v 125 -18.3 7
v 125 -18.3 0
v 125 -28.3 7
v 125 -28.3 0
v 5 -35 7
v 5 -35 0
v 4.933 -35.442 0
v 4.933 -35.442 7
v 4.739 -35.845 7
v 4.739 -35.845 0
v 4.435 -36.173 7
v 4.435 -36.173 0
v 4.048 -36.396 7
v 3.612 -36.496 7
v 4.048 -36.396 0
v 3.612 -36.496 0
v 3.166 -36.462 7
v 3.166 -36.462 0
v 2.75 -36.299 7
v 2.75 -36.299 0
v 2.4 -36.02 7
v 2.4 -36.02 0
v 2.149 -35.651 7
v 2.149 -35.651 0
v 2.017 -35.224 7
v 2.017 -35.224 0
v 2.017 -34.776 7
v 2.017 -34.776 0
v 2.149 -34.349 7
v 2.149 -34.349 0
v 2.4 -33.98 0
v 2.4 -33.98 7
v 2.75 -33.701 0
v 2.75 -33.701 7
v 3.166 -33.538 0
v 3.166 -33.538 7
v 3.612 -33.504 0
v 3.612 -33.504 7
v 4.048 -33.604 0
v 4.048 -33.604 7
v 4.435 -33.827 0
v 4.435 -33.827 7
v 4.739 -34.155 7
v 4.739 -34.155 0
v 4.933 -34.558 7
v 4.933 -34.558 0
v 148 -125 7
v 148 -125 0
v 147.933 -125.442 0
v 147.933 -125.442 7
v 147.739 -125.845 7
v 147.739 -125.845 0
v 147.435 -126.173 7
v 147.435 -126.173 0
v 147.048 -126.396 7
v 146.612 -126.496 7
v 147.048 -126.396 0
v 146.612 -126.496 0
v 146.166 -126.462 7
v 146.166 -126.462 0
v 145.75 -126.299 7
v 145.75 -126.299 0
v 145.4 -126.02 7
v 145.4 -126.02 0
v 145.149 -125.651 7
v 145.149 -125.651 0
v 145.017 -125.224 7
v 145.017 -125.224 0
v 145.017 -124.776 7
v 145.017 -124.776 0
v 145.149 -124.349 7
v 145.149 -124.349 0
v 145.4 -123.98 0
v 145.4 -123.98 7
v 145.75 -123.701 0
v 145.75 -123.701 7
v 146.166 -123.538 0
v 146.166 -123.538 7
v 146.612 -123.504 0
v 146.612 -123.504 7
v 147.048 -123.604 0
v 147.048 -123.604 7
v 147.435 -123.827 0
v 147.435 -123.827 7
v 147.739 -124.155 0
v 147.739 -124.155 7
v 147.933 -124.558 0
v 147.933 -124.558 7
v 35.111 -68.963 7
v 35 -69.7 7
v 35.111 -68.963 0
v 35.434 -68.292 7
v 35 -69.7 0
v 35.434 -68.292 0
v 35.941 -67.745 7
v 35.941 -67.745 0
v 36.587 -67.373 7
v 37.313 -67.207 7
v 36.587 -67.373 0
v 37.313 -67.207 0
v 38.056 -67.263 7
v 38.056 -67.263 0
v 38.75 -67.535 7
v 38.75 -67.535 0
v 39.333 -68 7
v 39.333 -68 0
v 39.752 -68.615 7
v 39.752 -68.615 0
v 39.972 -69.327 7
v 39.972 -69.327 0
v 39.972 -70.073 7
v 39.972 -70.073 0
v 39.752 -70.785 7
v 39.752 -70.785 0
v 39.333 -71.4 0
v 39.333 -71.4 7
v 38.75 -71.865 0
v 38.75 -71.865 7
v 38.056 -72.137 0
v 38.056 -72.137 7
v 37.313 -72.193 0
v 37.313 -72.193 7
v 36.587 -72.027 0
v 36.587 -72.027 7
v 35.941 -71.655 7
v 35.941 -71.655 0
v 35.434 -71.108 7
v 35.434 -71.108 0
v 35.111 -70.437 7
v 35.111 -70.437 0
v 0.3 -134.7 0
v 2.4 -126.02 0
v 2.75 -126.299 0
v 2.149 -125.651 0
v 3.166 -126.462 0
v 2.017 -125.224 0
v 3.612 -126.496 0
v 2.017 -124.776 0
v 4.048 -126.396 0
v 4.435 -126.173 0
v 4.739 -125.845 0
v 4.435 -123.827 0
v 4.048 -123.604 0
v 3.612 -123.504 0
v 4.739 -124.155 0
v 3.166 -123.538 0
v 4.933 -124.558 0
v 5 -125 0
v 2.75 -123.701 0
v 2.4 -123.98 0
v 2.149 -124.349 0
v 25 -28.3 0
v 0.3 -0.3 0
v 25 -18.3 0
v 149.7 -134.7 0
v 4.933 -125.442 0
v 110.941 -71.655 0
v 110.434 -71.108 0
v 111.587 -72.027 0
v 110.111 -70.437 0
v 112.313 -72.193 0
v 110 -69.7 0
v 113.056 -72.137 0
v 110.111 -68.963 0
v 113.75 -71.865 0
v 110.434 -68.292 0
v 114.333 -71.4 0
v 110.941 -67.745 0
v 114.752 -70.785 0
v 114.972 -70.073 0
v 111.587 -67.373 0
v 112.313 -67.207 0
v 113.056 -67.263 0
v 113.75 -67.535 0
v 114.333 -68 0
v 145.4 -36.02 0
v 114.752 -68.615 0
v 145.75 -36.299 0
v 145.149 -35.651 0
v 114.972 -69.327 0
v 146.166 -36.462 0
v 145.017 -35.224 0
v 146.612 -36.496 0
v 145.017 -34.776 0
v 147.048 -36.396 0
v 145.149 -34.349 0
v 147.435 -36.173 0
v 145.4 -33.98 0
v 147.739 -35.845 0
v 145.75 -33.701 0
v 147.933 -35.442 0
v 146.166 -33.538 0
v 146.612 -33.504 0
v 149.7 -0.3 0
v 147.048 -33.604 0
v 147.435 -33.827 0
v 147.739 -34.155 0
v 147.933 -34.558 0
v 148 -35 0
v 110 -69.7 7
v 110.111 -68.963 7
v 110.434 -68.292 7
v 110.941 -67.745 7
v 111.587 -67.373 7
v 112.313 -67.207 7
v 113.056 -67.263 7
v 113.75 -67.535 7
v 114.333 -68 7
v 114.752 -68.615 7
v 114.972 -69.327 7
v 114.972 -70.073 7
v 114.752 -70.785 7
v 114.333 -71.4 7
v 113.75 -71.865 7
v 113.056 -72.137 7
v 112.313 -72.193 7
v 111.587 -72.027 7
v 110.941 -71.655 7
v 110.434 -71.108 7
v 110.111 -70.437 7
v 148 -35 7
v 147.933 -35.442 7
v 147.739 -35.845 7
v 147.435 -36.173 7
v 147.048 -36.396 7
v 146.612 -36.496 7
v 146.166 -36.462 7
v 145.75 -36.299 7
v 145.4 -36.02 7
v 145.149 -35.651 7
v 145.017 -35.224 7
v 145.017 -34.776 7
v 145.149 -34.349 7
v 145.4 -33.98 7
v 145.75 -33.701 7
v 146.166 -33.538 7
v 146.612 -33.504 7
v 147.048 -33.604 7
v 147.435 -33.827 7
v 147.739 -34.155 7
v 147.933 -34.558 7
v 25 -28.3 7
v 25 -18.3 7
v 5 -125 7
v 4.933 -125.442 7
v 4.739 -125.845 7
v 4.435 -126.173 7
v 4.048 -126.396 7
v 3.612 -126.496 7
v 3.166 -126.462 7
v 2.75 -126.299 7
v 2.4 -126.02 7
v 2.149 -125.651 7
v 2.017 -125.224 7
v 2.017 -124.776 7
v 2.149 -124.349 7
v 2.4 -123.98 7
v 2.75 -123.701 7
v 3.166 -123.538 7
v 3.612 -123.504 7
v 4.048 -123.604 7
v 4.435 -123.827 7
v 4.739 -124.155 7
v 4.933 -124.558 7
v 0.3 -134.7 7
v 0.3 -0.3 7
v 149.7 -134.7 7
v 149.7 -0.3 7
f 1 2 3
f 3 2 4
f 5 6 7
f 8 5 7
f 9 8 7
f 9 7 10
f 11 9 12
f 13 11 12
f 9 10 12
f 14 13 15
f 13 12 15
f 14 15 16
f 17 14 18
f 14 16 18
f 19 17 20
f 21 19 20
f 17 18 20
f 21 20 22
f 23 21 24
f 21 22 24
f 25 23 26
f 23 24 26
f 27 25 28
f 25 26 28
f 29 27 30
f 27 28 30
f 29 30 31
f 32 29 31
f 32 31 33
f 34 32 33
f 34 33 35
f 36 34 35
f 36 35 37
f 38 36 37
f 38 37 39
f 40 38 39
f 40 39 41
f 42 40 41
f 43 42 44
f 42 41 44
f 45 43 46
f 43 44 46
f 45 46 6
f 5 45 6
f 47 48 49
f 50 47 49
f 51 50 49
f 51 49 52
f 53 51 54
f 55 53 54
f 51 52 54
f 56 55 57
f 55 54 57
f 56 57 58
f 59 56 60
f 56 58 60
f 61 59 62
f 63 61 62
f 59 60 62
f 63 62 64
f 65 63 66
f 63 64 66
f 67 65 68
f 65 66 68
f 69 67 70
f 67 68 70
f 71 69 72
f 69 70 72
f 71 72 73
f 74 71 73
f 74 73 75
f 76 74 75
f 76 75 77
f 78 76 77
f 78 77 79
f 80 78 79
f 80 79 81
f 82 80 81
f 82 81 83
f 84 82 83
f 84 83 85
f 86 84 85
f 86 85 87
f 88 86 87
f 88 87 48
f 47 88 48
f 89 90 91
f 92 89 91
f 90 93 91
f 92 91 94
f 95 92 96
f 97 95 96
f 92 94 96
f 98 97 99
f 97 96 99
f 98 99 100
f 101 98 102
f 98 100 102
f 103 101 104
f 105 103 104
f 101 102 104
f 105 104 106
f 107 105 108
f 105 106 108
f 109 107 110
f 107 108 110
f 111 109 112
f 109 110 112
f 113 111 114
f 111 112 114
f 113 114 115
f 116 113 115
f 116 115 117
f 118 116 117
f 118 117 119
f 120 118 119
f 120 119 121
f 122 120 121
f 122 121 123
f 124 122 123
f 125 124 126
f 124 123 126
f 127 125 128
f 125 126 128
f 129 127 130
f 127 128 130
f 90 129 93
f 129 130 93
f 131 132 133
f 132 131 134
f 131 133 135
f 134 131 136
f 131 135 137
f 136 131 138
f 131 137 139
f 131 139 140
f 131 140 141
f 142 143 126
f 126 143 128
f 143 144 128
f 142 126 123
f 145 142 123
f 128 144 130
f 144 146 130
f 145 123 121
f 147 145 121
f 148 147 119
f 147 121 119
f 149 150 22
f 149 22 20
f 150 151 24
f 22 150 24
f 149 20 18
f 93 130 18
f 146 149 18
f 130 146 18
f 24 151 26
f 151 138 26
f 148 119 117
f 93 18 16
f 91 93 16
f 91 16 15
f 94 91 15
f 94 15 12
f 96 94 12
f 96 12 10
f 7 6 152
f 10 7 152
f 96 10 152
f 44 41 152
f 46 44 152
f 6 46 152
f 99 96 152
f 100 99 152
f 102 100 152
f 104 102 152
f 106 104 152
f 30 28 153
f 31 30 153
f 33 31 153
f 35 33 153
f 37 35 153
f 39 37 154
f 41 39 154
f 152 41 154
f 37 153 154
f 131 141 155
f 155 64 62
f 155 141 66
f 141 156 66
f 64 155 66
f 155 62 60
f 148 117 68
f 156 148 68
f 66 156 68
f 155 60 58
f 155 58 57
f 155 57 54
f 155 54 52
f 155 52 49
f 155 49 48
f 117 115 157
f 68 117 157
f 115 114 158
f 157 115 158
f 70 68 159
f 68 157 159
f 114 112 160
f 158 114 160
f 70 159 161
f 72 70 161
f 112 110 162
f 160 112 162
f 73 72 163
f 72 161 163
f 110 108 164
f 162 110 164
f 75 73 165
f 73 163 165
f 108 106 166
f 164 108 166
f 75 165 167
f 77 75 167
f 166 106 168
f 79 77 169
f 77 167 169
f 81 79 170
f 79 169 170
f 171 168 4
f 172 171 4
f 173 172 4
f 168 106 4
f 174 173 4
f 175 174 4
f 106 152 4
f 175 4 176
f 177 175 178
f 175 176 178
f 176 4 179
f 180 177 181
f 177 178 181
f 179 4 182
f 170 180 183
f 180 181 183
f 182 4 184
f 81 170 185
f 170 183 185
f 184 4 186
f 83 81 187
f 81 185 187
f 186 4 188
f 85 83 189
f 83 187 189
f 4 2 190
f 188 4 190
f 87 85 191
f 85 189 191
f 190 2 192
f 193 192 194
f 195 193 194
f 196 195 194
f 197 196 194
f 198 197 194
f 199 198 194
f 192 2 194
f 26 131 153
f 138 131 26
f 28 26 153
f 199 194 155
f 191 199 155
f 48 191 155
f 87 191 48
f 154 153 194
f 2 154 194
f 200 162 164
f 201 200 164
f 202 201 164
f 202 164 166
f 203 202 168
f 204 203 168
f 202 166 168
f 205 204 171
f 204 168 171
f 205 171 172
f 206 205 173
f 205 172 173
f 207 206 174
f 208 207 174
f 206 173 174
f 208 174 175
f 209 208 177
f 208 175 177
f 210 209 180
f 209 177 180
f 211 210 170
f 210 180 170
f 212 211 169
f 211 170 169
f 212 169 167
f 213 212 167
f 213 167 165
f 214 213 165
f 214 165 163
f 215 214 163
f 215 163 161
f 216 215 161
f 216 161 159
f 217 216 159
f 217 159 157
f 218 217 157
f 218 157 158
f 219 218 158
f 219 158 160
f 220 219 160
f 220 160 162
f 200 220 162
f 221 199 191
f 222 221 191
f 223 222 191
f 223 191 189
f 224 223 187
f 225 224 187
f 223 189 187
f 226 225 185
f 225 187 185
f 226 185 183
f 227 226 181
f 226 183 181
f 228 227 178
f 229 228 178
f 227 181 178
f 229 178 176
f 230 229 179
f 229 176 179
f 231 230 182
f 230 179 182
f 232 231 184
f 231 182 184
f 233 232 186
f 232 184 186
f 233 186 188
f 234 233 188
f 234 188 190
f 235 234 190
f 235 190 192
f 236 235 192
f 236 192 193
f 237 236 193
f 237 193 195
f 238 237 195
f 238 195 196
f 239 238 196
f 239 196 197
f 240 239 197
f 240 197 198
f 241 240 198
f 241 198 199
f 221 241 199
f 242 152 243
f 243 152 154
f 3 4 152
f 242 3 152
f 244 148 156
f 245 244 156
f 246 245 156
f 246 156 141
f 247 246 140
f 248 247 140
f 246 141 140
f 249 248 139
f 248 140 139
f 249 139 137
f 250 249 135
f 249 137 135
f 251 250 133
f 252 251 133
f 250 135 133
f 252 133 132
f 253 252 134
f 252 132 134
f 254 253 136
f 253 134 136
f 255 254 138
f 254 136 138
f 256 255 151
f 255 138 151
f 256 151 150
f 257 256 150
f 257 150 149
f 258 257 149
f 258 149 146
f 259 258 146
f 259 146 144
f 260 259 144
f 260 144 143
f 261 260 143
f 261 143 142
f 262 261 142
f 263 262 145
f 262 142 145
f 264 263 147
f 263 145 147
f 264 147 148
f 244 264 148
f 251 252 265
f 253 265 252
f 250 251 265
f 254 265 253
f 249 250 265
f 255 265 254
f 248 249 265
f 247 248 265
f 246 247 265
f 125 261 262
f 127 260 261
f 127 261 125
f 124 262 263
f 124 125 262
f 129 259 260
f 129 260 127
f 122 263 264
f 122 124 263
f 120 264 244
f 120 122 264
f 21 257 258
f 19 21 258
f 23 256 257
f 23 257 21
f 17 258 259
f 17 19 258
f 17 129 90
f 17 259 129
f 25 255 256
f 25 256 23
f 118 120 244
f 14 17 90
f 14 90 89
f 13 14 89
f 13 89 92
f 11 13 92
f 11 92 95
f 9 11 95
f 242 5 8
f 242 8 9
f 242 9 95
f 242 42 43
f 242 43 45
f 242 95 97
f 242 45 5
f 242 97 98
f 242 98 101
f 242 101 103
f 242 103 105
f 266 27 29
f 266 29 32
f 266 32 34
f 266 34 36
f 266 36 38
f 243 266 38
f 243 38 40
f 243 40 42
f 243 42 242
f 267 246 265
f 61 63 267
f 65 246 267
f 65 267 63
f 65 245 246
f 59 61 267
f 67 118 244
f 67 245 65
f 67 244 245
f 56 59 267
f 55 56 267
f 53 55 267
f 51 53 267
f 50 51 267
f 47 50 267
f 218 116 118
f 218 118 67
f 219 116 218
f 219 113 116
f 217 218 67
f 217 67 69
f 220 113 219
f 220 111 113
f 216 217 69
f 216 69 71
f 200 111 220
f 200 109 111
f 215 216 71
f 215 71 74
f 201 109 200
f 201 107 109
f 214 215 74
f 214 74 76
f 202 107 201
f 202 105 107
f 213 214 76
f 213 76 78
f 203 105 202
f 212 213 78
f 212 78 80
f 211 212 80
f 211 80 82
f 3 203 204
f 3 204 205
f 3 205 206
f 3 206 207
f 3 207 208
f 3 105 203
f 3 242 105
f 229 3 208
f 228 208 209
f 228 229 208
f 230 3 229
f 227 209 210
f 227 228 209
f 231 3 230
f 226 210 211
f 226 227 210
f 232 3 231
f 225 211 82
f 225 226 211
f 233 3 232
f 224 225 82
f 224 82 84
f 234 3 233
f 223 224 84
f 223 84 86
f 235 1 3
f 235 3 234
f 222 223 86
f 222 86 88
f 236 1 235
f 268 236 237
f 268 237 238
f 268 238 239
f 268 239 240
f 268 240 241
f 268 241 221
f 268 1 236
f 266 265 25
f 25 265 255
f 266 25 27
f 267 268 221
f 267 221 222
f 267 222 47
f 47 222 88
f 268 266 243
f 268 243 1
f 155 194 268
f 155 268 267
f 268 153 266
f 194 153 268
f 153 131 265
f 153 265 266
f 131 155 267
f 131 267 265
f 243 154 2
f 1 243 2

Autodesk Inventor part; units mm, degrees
ref_plane "YZ Plane" through (0, 0, 0) normal (1, 0, 0) x (0, 1, 0)
ref_plane "XZ Plane" through (0, 0, 0) normal (0, 1, 0) x (-1, 0, 0)
ref_plane "XY Plane" through (0, 0, 0) normal (0, 0, 1) x (1, 0, 0)
sketch "Sketch1" plane through (0, 0, 0) normal (0, 0, 1) x (1, 0, 0)
  line L0 (0, 0) -> (150, 0)
  line L1 (150, 0) -> (150, -135)
  line L2 (150, -135) -> (0, -135)
  line L3 (0, -135) -> (0, 0)
  circle A0 centre (3.5, -35) radius 1.5
  line L4 (75, 0) -> (75, -135)
  circle A1 centre (146.5, -35) radius 1.5
  circle A2 centre (3.5, -125) radius 1.5
  circle A3 centre (146.5, -125) radius 1.5
  dimension "d0" = 150
  dimension "d1" = 135
  dimension "d2" = 3
  dimension "d3" = 3.5
  dimension "d4" = 35
  dimension "d5" = 3
  dimension "d6" = 3.5
  dimension "d7" = 90
extrude "Extrusion1" add sketch "Sketch1" along normal blind 7
move faces "Move1" translate (0, -0.3, 0) faces at (100, 0, 2.3333)
move faces "Move2" translate (-0.3, 0, 0) faces at (150, -90.1, 2.3333)
move faces "Move3" translate (0, 0.3, 0) faces at (49.9, -135, 2.3333)
move faces "Move4" translate (0.3, 0, 0) faces at (0, -45.1, 2.3333)
sketch "Sketch3" plane through (0, 0, 0) normal (0, 0, -1) x (-1, 0, 0)
  line L0 (-149.7, -134.7) -> (-149.7, -0.3) construction
  line L1 (-149.7, -23.3) -> (-0.3, -23.3) construction
  line L2 (-0.3, -0.3) -> (-0.3, -134.7) construction
  line L3 (-149.7, -0.3) -> (-0.3, -0.3) construction
  line L4 (-125, -28.3) -> (-25, -28.3)
  line L5 (-25, -28.3) -> (-25, -18.3)
  line L6 (-25, -18.3) -> (-125, -18.3)
  line L7 (-125, -18.3) -> (-125, -28.3)
  line L8 (-125, -28.3) -> (-25, -18.3) construction
  line L9 (-25, -28.3) -> (-125, -18.3) construction
  line L10 (-149.7, -0.3) -> (-0.3, -0.3) projected
  line L11 (-75, -0.3) -> (-75, -132.391)
  circle A0 centre (-112.5, -69.7) radius 2.5
  line L12 (-0.3, -134.7) -> (-149.7, -134.7) projected
  circle A1 centre (-37.5, -69.7) radius 2.5
  point P0 (0, 0)
  point P1 (-75, -23.3)
  dimension "d22" = 23
  dimension "d23" = 100
  dimension "d24" = 10
  dimension "d27" = 5
  dimension "d28" = 75
  dimension "d29" = 65
extrude "Extrusion2" cut sketch "Sketch3" against normal through all
sketch "Sketch5" plane through (0, 0, 7) normal (0, 0, 1) x (1, 0, 0)
  point P0 (0, 0)
sketch "Sketch6" plane through (0.3, -134.7, 0) normal (-1, 0, 0) x (0, 0, 1)
  point P0 (0, 134.7)
properties part number "mávač_víčko"
